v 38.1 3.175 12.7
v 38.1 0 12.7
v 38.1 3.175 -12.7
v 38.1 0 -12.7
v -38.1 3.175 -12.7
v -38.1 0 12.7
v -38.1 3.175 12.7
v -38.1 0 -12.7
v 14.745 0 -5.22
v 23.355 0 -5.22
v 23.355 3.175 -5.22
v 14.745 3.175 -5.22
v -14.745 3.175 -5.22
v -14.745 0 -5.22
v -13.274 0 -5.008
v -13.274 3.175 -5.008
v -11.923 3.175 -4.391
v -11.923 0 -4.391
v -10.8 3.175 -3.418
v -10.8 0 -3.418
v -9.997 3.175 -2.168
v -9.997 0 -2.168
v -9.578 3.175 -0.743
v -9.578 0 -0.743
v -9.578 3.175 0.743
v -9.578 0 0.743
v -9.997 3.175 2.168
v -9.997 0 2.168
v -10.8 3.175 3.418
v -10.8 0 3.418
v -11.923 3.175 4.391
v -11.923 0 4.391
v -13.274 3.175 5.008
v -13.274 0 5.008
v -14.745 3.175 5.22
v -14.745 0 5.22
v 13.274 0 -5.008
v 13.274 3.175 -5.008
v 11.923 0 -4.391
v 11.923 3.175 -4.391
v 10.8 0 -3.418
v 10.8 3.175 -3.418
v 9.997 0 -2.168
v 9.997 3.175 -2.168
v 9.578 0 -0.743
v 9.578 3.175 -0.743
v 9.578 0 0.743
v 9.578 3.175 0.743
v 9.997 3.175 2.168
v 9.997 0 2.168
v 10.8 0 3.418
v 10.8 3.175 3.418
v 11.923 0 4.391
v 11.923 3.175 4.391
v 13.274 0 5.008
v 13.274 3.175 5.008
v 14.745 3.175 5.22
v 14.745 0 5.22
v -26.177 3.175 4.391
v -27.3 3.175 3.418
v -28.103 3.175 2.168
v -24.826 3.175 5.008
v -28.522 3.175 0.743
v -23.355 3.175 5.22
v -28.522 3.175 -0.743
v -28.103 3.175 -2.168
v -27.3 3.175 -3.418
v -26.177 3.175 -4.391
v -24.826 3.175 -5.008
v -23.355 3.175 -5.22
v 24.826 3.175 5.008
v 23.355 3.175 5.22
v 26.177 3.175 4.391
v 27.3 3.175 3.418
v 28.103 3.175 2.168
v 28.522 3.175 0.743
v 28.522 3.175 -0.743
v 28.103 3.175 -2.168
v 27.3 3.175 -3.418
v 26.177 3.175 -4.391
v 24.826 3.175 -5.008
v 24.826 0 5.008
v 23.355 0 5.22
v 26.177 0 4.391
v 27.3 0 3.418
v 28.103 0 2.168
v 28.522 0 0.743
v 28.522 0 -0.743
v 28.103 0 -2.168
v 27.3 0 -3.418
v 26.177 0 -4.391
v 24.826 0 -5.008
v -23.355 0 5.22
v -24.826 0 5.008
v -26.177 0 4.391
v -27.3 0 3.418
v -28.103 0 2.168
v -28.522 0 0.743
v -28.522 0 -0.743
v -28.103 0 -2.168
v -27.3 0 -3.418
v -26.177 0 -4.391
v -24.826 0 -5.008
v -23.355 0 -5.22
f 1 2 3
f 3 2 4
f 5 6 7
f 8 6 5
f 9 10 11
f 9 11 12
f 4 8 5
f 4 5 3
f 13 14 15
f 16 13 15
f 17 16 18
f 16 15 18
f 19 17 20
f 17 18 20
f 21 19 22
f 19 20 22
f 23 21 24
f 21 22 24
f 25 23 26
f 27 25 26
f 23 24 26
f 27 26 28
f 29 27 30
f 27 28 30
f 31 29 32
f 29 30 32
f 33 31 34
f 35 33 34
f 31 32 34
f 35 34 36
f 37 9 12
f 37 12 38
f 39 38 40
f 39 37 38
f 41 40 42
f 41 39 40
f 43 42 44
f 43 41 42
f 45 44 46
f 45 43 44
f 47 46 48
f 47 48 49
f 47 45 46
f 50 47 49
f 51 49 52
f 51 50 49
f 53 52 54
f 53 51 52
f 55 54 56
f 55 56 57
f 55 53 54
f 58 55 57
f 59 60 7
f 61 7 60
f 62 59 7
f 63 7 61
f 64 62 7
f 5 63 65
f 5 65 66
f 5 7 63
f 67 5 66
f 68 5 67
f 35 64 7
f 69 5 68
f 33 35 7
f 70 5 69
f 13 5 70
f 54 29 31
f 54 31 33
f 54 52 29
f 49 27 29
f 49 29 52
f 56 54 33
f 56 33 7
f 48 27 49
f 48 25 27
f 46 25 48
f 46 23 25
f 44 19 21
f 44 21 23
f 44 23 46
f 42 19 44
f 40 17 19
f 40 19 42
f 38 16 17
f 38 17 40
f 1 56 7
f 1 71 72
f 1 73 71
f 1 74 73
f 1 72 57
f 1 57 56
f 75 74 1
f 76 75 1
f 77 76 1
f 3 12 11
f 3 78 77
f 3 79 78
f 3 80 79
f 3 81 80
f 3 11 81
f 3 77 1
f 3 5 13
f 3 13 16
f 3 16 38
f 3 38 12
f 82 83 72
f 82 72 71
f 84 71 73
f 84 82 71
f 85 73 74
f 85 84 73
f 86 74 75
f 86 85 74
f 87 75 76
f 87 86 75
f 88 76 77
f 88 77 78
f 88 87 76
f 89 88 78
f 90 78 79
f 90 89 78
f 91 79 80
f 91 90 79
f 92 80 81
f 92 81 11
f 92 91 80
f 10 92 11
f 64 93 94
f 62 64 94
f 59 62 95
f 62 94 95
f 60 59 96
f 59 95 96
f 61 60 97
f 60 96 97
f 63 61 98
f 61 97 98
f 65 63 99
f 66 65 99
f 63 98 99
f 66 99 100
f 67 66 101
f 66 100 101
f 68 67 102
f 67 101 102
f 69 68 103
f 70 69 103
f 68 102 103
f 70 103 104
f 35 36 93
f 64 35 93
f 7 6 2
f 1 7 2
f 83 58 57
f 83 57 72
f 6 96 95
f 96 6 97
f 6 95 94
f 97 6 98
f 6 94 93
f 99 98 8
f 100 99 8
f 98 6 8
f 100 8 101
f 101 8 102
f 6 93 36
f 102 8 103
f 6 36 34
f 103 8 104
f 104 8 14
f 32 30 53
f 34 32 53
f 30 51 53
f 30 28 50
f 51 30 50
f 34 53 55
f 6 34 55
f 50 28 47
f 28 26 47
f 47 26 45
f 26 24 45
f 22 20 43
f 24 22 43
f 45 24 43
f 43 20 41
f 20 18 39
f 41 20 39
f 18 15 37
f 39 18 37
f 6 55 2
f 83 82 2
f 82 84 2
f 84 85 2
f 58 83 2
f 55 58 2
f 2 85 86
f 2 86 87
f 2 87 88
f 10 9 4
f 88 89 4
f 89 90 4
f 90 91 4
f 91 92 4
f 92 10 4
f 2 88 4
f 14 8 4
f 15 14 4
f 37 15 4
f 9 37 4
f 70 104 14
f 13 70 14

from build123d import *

# Parameters (mm, degrees)
SKETCH1_W           = 76.2
SKETCH1_H           = 25.4
BOSS_EXTRUDE1_DEPTH = 3.175


with BuildPart() as part:
    # Sketch1 → Boss-Extrude1 (new body)
    with BuildSketch(Plane(origin=(0, 0, 0), x_dir=(1, 0, 0), z_dir=(0, 1, 0))):
        Rectangle(SKETCH1_W, SKETCH1_H)
        with BuildLine():
            Line((-23.3553, 5.2197), (-14.7447, 5.2197))
            ThreePointArc((-14.7447, 5.2197), (-9.525, 0), (-14.7447, -5.2197))
            Line((-14.7447, -5.2197), (-23.3553, -5.2197))
            ThreePointArc((-23.3553, -5.2197), (-28.575, 0), (-23.3553, 5.2197))
        make_face(mode=Mode.SUBTRACT)
        with BuildLine():
            Line((23.3553, 5.2197), (14.7447, 5.2197))
            ThreePointArc((14.7447, 5.2197), (9.525, 0), (14.7447, -5.2197))
            Line((14.7447, -5.2197), (23.3553, -5.2197))
            ThreePointArc((23.3553, -5.2197), (28.575, 0), (23.3553, 5.2197))
        make_face(mode=Mode.SUBTRACT)
    extrude(amount=BOSS_EXTRUDE1_DEPTH)


solid = part.part
